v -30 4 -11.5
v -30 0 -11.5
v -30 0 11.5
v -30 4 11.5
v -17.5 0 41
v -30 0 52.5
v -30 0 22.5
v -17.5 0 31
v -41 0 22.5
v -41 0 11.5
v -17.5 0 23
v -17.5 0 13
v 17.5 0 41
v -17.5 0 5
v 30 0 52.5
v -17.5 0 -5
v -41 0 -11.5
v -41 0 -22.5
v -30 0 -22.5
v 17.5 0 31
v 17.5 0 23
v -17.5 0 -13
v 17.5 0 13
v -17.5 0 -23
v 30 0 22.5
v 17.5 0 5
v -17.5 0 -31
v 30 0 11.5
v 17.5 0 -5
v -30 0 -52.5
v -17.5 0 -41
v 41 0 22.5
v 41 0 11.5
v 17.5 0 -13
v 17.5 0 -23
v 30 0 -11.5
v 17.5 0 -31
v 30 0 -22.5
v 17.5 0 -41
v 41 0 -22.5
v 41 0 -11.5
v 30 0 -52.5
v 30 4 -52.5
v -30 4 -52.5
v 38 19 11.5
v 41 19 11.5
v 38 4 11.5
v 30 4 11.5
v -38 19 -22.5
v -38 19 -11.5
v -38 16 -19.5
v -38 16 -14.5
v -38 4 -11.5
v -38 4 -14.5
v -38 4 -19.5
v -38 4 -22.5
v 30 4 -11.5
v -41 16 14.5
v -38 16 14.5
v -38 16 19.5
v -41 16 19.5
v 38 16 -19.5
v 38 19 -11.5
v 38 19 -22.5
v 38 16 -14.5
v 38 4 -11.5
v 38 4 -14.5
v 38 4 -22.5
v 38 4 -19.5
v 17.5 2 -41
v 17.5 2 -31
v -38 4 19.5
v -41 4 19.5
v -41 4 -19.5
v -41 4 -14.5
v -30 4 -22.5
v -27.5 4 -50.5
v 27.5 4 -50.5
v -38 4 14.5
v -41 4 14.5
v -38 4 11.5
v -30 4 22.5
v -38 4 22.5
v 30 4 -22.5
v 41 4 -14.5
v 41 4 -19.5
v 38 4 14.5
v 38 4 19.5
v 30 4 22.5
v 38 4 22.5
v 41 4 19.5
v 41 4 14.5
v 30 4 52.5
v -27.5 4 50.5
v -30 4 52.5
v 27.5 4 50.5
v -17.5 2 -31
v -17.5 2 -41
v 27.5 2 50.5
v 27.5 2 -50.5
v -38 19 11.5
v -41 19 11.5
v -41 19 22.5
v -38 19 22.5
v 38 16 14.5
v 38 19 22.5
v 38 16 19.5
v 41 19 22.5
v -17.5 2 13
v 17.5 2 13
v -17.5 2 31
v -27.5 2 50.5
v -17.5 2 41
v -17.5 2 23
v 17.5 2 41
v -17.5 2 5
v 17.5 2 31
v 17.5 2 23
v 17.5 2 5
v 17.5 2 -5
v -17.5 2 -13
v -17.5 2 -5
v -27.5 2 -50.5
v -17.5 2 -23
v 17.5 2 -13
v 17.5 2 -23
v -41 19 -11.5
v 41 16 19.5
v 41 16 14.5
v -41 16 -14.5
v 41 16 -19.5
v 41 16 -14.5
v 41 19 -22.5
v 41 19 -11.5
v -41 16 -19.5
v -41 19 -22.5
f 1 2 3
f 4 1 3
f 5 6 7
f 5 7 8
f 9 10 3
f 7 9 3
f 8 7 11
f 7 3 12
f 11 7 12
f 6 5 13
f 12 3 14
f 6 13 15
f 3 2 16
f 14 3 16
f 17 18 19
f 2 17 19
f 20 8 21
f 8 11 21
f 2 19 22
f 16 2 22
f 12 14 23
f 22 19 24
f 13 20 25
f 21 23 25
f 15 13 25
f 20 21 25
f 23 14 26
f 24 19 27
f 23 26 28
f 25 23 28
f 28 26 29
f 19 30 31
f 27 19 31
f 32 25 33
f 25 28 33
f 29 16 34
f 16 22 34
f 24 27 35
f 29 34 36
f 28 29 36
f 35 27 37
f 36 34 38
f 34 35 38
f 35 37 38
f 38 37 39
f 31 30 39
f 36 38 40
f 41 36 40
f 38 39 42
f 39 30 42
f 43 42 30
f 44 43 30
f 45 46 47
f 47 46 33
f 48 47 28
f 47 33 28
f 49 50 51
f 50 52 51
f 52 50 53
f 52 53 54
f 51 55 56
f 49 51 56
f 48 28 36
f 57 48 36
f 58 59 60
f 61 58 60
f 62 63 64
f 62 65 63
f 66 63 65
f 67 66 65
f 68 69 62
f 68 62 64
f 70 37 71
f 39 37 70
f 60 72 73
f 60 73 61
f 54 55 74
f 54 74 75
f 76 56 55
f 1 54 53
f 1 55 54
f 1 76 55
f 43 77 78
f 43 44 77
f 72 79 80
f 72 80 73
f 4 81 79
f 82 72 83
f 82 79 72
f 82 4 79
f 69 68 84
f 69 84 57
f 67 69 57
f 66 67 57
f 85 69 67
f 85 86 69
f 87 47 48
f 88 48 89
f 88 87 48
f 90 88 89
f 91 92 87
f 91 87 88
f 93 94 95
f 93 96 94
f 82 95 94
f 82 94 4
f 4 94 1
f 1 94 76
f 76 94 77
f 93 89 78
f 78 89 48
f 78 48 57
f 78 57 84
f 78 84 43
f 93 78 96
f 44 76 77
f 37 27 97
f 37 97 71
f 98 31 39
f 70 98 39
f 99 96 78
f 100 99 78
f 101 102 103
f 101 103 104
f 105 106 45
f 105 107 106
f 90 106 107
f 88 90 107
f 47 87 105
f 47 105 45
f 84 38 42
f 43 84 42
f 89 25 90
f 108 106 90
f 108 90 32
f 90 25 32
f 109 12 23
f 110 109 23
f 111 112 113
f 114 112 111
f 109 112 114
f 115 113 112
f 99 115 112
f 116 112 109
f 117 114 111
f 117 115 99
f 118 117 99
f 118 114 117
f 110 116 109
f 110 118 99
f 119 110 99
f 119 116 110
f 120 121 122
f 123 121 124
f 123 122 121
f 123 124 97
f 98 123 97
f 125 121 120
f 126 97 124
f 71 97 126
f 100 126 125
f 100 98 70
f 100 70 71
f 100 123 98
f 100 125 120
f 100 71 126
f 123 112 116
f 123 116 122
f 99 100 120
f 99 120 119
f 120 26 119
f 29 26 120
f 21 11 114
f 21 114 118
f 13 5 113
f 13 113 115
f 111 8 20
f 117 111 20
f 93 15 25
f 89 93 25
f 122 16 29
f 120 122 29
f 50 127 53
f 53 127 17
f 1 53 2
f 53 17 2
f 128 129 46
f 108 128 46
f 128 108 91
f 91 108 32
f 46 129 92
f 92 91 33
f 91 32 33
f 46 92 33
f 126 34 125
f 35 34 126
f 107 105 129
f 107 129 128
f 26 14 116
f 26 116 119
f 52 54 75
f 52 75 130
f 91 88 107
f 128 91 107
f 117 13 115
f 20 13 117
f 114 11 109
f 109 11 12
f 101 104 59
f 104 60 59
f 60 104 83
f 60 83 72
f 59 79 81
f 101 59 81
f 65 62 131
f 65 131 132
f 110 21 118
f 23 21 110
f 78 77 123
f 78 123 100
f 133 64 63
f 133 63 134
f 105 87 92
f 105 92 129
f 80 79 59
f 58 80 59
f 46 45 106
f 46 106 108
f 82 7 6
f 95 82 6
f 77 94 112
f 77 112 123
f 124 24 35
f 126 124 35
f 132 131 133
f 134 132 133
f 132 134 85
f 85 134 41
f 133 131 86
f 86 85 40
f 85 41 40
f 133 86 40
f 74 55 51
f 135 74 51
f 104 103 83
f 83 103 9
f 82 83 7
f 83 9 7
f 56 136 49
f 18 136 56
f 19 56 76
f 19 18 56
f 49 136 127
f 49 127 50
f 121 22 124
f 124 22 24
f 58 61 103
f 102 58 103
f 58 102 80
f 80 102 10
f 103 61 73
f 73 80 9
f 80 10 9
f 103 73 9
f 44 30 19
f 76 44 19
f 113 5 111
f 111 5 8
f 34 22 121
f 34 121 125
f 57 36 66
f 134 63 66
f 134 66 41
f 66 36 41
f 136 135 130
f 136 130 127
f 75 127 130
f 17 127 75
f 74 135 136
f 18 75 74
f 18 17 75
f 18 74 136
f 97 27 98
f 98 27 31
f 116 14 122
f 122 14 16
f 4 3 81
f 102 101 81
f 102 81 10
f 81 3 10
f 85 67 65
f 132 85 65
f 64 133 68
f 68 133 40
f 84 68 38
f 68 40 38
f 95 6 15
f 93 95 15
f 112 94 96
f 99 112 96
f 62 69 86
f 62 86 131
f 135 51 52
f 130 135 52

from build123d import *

# Parameters (mm, degrees)
SALIENTE_EXTRUIR1_DEPTH    = 4
CROQUIS2_W                 = 55
CROQUIS2_H                 = 101
CORTAR_EXTRUIR1_DEPTH      = 2
CROQUIS12_W                = 3
CROQUIS12_H                = 11
SALIENTE_EXTRUIR2_DEPTH    = 15
CROQUIS13_W                = 5
CROQUIS13_H                = 12
CORTAR_EXTRUIR8_DEPTH      = 80
CORTAR_EXTRUIR8_DEPTH_BACK = 4
CROQUIS14_W                = 5
CROQUIS14_H                = 12
CORTAR_EXTRUIR9_DEPTH      = 80
CORTAR_EXTRUIR9_DEPTH_BACK = 4
CROQUIS15_W                = 35
CROQUIS15_H                = 10
CORTAR_EXTRUIR10_DEPTH     = 20


with BuildPart() as part:
    # Croquis1 → Saliente-Extruir1 (new body)
    with BuildSketch(Plane(origin=(0, 0, 0), x_dir=(1, 0, 0), z_dir=(0, 1, 0))):
        Polygon((30, -52.5), (30, -22.5), (41, -22.5), (41, -11.5), (30, -11.5), (30, 11.5), (41, 11.5), (41, 22.5), (30, 22.5), (30, 52.5), (-30, 52.5), (-30, 22.5), (-41, 22.5), (-41, 11.5), (-30, 11.5), (-30, -11.5), (-41, -11.5), (-41, -22.5), (-30, -22.5), (-30, -52.5), align=None)
    extrude(amount=SALIENTE_EXTRUIR1_DEPTH)

    # Croquis2 → Cortar-Extruir1 (cut)
    with BuildSketch(Plane(origin=(0, 4, 0), x_dir=(1, 0, 0), z_dir=(0, 1, 0))):
        Rectangle(CROQUIS2_W, CROQUIS2_H)
    extrude(amount=-CORTAR_EXTRUIR1_DEPTH, mode=Mode.SUBTRACT)

    # Croquis12 → Saliente-Extruir2 (add)
    with BuildSketch(Plane(origin=(0, 4, 0), x_dir=(1, 0, 0), z_dir=(0, 1, 0))):
        with Locations((-39.5, 17)):
            Rectangle(CROQUIS12_W, CROQUIS12_H)
        with Locations((-39.5, -17)):
            Rectangle(CROQUIS12_W, CROQUIS12_H)
        with Locations((39.5, -17)):
            Rectangle(CROQUIS12_W, CROQUIS12_H)
        with Locations((39.5, 17)):
            Rectangle(CROQUIS12_W, CROQUIS12_H)
    extrude(amount=SALIENTE_EXTRUIR2_DEPTH)

    # Croquis13 → Cortar-Extruir8 (cut, two sides)
    with BuildSketch(Plane.ZY.offset(-38)) as cortar_extruir8_sk:
        with Locations((-17, 10)):
            Rectangle(CROQUIS13_W, CROQUIS13_H)
    extrude(amount=CORTAR_EXTRUIR8_DEPTH, mode=Mode.SUBTRACT)
    extrude(cortar_extruir8_sk.sketch, amount=-CORTAR_EXTRUIR8_DEPTH_BACK, mode=Mode.SUBTRACT)

    # Croquis14 → Cortar-Extruir9 (cut, two sides)
    with BuildSketch(Plane.ZY.offset(-38)) as cortar_extruir9_sk:
        with Locations((17, 10)):
            Rectangle(CROQUIS14_W, CROQUIS14_H)
    extrude(amount=CORTAR_EXTRUIR9_DEPTH, mode=Mode.SUBTRACT)
    extrude(cortar_extruir9_sk.sketch, amount=-CORTAR_EXTRUIR9_DEPTH_BACK, mode=Mode.SUBTRACT)

    # Croquis15 → Cortar-Extruir10 (cut, through all)
    with BuildSketch(Plane(origin=(0, 0, 0), x_dir=(1, 0, 0), z_dir=(0, 1, 0))):
        Rectangle(CROQUIS15_W, CROQUIS15_H)
        with Locations((0, -18)):
            Rectangle(CROQUIS15_W, CROQUIS15_H)
        with Locations((0, -36)):
            Rectangle(CROQUIS15_W, CROQUIS15_H)
        with Locations((0, 18)):
            Rectangle(CROQUIS15_W, CROQUIS15_H)
        with Locations((0, 36)):
            Rectangle(CROQUIS15_W, CROQUIS15_H)
    extrude(amount=CORTAR_EXTRUIR10_DEPTH, mode=Mode.SUBTRACT)


solid = part.part
